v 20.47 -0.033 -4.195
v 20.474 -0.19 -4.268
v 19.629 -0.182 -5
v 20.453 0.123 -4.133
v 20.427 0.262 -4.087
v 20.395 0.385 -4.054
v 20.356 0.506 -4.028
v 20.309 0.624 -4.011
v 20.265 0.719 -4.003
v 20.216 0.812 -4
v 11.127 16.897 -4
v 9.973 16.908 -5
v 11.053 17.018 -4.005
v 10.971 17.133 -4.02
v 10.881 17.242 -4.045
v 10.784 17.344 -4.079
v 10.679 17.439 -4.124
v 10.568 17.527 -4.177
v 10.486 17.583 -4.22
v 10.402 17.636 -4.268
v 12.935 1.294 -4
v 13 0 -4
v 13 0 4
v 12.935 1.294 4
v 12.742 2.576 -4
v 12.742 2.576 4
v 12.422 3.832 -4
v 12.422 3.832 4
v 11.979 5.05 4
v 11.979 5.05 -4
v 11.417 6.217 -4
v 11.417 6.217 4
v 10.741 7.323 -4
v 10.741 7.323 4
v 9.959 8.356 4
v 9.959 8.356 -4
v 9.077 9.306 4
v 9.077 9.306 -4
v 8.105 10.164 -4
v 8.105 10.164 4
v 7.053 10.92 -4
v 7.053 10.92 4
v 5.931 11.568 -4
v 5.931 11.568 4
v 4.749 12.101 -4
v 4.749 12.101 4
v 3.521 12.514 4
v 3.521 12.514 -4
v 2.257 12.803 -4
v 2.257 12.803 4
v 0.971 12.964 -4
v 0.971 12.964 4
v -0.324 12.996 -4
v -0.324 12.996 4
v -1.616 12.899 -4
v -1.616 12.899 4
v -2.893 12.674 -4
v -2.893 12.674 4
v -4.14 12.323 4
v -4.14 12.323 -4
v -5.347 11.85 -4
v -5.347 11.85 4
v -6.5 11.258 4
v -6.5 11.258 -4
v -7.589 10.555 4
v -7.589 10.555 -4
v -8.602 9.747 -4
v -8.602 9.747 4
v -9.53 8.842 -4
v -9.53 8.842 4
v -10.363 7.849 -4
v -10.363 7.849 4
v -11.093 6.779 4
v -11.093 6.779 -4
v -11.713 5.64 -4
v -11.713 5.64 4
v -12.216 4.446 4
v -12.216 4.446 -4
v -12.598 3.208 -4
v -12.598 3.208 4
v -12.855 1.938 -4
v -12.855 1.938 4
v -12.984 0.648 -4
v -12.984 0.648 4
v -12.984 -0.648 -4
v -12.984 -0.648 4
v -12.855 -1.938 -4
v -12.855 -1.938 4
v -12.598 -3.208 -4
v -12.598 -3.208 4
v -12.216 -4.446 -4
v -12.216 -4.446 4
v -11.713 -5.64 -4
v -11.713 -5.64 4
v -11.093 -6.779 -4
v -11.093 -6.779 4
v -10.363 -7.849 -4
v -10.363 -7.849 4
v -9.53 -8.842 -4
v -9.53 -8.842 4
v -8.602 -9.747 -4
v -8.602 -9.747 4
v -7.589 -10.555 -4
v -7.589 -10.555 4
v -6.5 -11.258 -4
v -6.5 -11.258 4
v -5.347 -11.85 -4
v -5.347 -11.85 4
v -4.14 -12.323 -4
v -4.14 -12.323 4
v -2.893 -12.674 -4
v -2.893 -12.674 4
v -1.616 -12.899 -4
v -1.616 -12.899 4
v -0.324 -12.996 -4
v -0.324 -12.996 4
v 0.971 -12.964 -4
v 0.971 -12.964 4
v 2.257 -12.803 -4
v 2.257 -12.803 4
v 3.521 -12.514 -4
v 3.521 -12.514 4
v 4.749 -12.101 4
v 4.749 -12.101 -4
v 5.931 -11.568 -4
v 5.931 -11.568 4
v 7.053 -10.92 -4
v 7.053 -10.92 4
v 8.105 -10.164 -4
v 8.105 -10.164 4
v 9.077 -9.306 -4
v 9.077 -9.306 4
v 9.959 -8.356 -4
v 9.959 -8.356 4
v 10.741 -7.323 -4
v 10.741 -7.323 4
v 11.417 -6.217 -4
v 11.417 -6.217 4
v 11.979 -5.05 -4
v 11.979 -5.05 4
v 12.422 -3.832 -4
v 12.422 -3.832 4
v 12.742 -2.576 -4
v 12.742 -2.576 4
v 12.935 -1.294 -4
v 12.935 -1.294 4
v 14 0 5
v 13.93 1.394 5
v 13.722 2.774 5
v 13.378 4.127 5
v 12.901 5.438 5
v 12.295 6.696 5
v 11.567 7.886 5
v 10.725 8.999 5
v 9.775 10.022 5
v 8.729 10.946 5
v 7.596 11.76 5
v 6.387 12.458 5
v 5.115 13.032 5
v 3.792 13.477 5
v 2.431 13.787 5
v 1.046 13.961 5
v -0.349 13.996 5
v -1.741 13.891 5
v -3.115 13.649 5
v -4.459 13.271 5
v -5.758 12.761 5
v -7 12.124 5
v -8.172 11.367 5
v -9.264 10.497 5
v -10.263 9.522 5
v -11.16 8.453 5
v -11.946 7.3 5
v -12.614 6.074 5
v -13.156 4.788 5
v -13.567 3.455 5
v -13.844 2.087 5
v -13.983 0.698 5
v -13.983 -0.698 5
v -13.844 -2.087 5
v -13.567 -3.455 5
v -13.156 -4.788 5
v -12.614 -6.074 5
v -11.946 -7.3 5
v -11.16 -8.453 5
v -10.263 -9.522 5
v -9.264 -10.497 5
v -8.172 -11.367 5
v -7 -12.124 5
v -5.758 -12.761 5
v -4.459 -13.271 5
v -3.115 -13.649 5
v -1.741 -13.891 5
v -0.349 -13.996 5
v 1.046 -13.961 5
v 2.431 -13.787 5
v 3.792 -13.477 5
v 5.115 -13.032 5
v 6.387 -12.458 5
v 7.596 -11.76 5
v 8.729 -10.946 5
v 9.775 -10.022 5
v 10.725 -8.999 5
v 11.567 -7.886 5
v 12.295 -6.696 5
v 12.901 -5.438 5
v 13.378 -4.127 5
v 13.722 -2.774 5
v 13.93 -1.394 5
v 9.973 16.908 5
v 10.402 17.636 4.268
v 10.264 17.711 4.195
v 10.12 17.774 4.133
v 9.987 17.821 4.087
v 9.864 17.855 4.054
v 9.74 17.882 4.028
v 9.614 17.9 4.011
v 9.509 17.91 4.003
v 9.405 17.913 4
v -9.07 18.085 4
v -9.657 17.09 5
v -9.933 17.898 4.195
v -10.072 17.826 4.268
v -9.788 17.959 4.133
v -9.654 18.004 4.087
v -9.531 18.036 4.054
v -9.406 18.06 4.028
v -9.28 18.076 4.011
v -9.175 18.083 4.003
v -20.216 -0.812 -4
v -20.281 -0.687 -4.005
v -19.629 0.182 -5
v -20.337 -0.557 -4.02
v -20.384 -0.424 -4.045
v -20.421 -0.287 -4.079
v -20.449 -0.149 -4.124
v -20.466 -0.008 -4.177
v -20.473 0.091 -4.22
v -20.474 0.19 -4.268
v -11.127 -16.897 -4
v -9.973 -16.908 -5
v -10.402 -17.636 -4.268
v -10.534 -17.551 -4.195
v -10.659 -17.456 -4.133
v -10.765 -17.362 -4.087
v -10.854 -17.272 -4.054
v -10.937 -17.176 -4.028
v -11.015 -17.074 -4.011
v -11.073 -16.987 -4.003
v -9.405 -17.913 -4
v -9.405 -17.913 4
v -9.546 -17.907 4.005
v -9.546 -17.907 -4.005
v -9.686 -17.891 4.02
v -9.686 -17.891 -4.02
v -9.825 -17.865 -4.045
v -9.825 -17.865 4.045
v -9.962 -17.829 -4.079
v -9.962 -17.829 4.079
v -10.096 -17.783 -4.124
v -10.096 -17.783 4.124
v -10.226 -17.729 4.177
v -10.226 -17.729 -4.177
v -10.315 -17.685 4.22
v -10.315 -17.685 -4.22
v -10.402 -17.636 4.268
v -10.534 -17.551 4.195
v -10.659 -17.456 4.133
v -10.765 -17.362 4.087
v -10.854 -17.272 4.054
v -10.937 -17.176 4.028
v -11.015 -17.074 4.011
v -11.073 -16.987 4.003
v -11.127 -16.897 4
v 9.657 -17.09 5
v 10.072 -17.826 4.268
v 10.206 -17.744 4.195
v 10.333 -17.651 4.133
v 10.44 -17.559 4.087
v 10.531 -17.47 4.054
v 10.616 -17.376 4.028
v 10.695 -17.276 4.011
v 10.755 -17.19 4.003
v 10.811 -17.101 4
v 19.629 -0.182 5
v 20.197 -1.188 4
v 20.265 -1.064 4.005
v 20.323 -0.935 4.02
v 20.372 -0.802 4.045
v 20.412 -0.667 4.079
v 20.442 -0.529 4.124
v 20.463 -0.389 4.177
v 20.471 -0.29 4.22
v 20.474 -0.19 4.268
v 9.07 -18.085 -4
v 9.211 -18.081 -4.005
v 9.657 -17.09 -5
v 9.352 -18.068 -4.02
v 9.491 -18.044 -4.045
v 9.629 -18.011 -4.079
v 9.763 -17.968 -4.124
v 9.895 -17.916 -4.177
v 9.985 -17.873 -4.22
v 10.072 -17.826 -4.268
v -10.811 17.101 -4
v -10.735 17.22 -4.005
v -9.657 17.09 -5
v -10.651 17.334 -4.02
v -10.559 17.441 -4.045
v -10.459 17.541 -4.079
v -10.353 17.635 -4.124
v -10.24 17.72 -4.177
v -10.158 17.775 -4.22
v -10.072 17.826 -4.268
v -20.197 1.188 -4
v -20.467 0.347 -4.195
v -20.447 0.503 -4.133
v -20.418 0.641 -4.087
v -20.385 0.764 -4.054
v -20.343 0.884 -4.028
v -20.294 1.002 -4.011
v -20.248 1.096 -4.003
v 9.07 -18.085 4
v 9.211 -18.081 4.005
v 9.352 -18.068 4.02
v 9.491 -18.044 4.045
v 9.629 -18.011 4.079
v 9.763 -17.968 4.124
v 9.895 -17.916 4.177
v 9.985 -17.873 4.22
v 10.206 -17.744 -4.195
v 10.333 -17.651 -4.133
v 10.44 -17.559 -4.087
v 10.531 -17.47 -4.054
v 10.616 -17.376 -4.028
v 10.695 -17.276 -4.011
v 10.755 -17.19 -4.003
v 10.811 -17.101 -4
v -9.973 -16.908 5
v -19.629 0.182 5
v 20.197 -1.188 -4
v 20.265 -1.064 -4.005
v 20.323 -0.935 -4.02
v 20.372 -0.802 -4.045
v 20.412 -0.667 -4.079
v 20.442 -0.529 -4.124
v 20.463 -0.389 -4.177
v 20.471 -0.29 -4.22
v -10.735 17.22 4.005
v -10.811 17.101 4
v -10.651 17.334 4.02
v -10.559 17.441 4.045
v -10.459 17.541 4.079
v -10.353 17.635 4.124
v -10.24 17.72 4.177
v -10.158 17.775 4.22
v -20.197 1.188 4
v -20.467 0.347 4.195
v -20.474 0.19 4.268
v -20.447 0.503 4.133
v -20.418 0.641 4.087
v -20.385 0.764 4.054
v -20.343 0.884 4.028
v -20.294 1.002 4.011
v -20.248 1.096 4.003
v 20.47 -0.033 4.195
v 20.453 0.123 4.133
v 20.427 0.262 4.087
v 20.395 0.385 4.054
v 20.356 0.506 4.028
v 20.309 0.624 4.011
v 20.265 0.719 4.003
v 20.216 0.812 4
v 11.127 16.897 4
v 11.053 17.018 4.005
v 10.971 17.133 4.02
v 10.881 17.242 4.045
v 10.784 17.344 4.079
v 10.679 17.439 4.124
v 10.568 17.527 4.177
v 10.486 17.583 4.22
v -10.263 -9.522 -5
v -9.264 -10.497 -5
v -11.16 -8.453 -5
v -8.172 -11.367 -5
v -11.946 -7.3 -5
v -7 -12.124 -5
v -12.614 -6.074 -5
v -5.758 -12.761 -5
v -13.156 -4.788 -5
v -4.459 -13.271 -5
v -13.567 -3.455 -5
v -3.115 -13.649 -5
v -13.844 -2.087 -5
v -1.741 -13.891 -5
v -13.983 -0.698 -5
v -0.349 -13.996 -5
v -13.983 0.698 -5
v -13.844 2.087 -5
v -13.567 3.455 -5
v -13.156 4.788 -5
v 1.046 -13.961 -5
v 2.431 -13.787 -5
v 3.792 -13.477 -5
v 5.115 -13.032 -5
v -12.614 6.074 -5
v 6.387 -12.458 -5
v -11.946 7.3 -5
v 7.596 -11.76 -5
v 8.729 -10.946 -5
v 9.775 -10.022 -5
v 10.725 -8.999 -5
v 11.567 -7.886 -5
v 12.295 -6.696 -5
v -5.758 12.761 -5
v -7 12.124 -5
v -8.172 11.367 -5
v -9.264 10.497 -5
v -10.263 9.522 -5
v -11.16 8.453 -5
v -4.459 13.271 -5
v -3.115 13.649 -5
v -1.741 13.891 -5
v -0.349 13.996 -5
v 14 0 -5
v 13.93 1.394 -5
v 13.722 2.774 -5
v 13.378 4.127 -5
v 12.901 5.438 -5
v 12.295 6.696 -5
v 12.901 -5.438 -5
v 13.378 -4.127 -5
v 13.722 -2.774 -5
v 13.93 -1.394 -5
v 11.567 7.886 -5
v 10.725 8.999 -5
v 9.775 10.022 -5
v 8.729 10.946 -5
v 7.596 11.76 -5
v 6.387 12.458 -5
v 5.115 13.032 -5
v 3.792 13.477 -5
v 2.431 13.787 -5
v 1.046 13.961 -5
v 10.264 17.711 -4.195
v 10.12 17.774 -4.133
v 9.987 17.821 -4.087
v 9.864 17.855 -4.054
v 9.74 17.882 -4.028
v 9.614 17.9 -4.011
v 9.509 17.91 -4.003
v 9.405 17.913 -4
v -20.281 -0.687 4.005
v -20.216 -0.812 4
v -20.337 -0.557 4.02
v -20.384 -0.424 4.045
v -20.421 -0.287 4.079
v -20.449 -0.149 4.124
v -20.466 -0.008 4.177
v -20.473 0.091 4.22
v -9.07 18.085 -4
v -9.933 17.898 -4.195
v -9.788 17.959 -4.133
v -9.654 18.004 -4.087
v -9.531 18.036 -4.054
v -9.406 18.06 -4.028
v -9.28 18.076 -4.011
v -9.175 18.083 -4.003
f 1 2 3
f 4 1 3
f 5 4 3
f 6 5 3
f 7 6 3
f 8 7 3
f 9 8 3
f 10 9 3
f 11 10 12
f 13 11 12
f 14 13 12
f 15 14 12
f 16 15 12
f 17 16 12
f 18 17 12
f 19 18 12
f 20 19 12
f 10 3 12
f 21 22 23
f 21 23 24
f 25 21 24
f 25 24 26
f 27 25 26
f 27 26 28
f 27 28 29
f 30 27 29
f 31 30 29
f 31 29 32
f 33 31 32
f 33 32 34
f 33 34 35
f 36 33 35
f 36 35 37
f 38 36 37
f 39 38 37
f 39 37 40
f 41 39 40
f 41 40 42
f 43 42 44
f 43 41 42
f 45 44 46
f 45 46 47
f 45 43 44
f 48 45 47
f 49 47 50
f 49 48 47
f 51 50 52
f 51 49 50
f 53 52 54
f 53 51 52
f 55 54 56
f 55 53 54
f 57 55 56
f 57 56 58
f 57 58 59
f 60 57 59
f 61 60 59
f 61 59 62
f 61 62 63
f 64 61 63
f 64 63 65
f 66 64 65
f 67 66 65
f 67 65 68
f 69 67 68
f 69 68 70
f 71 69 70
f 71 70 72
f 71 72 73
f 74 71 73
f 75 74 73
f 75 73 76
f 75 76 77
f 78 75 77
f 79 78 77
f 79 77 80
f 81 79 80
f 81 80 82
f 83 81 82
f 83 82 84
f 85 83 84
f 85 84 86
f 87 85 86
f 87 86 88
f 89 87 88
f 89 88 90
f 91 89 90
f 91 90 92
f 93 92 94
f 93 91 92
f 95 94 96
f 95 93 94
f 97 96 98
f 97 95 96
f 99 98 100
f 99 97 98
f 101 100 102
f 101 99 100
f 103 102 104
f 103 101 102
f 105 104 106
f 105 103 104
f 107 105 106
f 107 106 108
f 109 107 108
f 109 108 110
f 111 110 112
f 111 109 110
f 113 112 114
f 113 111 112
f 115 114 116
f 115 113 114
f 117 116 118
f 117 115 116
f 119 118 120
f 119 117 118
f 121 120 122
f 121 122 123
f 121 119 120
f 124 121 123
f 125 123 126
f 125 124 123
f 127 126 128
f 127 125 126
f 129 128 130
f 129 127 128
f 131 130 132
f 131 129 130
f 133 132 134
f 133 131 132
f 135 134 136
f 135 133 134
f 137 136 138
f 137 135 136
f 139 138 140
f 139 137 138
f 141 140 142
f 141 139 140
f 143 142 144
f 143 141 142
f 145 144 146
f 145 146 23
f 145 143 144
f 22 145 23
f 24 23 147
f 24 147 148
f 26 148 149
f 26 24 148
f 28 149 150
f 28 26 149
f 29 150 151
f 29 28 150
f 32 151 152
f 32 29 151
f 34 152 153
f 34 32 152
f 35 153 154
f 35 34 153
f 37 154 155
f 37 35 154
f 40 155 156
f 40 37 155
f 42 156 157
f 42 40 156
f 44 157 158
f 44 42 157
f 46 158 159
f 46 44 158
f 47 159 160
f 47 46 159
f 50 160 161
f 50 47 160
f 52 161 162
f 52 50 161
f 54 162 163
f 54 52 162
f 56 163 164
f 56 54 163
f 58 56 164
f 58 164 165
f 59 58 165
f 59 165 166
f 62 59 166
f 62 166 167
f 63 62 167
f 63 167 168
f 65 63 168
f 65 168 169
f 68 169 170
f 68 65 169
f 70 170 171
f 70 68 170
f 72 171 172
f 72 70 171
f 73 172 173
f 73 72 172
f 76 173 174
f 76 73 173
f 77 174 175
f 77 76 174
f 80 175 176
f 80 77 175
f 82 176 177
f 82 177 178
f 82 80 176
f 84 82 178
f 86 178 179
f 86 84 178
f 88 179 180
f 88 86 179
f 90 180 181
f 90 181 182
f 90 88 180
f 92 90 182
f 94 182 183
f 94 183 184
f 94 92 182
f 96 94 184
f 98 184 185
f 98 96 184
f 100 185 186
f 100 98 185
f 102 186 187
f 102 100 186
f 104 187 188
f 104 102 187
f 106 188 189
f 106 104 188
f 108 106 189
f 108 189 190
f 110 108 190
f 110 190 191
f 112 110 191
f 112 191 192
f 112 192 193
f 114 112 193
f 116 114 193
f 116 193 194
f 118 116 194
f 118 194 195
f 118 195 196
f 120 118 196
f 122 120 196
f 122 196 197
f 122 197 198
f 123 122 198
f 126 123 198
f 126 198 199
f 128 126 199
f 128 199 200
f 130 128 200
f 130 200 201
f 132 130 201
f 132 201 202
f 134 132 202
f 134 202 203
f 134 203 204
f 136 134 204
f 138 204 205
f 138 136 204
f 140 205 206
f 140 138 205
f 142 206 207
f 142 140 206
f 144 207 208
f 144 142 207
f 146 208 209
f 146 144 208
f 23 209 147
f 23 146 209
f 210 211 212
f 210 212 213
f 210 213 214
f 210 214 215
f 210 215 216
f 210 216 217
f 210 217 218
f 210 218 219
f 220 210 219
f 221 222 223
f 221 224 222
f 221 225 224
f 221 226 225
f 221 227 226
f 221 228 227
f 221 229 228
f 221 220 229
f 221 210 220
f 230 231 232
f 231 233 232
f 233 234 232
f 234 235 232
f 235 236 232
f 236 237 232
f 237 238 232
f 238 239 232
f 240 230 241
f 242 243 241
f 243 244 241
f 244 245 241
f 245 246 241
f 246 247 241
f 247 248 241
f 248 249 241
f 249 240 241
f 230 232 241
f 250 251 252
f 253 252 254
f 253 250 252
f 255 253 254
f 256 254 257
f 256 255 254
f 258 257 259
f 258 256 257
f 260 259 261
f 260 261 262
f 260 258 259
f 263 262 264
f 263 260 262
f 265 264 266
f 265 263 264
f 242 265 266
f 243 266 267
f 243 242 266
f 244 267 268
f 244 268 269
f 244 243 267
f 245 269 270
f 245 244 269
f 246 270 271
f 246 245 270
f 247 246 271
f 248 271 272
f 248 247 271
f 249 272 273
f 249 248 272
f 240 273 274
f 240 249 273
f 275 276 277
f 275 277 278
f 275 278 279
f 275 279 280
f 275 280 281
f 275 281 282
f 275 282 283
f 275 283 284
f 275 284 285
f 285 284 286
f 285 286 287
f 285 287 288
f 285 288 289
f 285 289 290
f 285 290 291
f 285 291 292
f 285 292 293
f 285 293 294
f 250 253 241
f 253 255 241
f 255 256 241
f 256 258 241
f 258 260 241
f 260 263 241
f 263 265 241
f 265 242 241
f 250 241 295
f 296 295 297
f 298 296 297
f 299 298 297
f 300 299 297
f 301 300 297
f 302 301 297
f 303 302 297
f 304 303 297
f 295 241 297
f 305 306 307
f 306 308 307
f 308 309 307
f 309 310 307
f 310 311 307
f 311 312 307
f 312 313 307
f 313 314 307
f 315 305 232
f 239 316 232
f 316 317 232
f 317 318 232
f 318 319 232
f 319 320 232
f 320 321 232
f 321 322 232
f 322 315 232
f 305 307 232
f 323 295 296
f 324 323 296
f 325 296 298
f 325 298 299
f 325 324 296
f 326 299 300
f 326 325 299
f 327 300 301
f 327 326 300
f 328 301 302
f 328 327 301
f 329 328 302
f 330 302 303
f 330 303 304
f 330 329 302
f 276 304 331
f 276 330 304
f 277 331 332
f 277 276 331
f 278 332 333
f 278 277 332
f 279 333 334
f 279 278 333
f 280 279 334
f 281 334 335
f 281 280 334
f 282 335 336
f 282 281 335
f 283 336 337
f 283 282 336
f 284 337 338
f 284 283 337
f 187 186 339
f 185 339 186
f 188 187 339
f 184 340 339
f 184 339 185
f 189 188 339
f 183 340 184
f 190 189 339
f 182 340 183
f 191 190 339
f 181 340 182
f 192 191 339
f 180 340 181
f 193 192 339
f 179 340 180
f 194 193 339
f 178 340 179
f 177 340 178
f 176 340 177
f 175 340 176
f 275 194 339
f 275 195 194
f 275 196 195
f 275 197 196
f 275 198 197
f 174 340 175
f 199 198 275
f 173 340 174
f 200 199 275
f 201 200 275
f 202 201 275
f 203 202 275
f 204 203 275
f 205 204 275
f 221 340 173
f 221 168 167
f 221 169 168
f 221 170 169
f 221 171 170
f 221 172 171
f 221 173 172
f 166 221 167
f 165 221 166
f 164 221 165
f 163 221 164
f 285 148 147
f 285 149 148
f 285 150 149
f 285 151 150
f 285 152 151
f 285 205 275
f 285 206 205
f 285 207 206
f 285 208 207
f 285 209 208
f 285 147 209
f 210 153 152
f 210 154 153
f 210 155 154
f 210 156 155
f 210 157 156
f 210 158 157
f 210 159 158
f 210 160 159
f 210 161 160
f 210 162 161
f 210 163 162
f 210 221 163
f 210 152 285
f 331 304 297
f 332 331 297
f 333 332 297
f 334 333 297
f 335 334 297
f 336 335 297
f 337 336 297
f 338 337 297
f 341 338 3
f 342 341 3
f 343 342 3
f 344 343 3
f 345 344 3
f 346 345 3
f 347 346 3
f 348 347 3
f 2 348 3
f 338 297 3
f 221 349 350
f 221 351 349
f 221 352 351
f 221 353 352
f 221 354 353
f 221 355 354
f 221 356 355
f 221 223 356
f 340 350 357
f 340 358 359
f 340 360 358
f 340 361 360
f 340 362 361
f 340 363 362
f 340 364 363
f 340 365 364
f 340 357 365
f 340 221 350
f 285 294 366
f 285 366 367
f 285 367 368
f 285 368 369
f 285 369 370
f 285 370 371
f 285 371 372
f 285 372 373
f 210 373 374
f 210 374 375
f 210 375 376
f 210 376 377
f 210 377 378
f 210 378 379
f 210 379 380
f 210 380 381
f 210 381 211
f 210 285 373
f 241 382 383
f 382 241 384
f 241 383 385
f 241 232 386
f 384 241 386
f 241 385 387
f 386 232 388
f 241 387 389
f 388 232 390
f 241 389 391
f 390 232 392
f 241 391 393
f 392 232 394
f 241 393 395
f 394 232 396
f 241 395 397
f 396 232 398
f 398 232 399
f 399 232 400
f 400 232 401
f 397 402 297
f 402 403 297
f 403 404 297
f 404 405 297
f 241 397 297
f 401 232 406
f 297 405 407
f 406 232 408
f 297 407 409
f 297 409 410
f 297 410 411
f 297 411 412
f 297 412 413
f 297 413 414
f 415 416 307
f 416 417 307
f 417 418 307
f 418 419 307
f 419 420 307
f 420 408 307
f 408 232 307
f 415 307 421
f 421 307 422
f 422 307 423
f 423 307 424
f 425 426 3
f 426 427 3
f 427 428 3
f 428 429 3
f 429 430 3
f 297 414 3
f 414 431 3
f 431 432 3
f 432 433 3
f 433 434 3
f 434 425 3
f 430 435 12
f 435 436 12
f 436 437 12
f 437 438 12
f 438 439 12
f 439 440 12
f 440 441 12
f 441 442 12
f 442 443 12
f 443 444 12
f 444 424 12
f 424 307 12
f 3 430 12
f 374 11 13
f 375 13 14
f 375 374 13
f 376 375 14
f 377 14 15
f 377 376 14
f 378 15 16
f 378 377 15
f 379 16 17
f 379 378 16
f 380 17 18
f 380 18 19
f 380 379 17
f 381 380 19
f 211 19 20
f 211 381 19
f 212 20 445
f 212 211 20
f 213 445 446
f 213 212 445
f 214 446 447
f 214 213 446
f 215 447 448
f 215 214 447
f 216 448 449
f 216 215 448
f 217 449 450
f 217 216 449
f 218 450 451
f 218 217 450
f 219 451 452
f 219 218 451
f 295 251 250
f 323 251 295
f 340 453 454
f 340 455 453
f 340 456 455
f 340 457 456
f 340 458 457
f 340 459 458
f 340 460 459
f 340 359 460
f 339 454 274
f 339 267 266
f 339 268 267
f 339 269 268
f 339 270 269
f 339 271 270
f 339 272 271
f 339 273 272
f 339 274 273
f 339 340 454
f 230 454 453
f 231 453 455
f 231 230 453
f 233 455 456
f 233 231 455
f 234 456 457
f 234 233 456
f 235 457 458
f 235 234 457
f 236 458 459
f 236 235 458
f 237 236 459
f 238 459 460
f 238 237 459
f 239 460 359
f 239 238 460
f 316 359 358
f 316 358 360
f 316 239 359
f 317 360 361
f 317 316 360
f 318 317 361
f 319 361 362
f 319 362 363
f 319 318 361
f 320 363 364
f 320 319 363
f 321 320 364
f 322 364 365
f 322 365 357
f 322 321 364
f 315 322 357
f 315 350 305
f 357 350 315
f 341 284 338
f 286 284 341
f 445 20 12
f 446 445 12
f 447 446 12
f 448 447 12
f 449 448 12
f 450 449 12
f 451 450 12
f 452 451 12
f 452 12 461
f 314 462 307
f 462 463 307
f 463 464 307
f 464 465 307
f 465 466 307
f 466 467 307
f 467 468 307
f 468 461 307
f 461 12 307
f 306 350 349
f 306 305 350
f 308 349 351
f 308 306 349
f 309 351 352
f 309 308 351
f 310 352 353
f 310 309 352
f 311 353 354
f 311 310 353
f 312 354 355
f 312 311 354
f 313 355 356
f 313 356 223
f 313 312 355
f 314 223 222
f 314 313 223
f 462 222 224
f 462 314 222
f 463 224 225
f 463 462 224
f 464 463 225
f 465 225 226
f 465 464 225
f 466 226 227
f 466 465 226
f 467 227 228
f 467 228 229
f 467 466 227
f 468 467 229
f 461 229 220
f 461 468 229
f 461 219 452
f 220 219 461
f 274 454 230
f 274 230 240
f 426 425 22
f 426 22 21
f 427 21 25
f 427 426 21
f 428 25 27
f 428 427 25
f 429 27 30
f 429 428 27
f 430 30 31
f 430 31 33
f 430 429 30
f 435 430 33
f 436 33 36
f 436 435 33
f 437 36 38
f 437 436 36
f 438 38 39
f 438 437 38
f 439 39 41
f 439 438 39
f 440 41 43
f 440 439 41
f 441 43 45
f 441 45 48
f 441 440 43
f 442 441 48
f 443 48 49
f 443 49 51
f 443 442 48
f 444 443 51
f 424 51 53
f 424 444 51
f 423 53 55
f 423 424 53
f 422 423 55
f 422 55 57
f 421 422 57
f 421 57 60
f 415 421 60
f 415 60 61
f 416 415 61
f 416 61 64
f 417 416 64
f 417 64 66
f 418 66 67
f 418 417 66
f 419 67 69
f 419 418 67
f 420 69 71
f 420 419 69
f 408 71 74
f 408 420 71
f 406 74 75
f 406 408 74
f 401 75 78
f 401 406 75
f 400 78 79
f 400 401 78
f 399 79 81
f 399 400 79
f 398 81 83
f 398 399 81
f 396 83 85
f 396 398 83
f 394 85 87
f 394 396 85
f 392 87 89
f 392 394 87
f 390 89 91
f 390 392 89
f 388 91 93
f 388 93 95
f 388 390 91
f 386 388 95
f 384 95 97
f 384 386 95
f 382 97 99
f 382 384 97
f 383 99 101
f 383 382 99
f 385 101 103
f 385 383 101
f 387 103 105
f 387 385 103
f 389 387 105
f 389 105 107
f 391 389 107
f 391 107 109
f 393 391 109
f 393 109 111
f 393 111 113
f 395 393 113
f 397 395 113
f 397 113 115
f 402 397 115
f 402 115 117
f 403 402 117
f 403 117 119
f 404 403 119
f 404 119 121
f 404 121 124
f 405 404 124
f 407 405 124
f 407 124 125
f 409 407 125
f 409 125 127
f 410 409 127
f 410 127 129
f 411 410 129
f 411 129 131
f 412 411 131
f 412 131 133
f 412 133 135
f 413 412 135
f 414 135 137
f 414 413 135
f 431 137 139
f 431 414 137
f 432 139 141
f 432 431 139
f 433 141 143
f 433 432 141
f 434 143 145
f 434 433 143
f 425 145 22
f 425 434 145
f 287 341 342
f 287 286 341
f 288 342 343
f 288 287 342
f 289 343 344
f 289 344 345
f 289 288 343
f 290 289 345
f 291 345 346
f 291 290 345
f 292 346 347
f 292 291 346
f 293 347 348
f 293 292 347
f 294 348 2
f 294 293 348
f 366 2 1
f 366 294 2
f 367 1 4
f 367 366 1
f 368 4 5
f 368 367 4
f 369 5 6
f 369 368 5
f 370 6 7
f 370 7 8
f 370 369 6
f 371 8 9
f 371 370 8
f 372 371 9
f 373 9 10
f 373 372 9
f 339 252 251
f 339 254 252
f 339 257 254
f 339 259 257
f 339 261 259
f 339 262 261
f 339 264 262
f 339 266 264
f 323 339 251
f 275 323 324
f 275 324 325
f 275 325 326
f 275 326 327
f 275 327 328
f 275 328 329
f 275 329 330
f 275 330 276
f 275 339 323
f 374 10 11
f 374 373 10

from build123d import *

# Parameters (mm, degrees)
F0_R     = 13
F1_DEPTH = 5
F2_SIZE  = 1
F3_R     = 2


with BuildPart() as f1:
    # F0 (on Top) → F1 (new body, symmetric)
    with BuildSketch(Plane.XY):
        Polygon((-10.5591686686, -17.9026243056), (10.2245431088, -18.0958204627), (20.7837117774, -0.193196157), (10.5591686686, 17.9026243056), (-10.2245431088, 18.0958204627), (-20.7837117774, 0.193196157), align=None)
        Circle(F0_R, mode=Mode.SUBTRACT)
    extrude(amount=F1_DEPTH, both=True)

    # F2
    f2_edges = [f1.edges().sort_by_distance(p)[0] for p in [
        (-15.67144, -8.854714, 5),
        (-0.167313, -17.999222, 5),
        (15.504127, -9.144508, 5),
        (15.67144, 8.854714, 5),
        (0.167313, 17.999222, 5),
        (-15.504127, 9.144508, 5),
        (-13, 0, 5),
        (-15.67144, -8.854714, -5),
        (-0.167313, -17.999222, -5),
        (15.504127, -9.144508, -5),
        (15.67144, 8.854714, -5),
        (0.167313, 17.999222, -5),
        (-15.504127, 9.144508, -5),
        (-13, 0, -5),
    ]]
    chamfer(f2_edges, length=F2_SIZE)

    # F3
    f3_edges = [f1.edges().sort_by_distance(p)[0] for p in [
        (10.559169, 17.902624, 0),
        (-10.224543, 18.09582, 0),
        (-20.783712, 0.193196, 0),
        (-10.559169, -17.902624, 0),
        (10.224543, -18.09582, 0),
        (20.783712, -0.193196, 0),
    ]]
    fillet(f3_edges, radius=F3_R)


solid = f1.part
